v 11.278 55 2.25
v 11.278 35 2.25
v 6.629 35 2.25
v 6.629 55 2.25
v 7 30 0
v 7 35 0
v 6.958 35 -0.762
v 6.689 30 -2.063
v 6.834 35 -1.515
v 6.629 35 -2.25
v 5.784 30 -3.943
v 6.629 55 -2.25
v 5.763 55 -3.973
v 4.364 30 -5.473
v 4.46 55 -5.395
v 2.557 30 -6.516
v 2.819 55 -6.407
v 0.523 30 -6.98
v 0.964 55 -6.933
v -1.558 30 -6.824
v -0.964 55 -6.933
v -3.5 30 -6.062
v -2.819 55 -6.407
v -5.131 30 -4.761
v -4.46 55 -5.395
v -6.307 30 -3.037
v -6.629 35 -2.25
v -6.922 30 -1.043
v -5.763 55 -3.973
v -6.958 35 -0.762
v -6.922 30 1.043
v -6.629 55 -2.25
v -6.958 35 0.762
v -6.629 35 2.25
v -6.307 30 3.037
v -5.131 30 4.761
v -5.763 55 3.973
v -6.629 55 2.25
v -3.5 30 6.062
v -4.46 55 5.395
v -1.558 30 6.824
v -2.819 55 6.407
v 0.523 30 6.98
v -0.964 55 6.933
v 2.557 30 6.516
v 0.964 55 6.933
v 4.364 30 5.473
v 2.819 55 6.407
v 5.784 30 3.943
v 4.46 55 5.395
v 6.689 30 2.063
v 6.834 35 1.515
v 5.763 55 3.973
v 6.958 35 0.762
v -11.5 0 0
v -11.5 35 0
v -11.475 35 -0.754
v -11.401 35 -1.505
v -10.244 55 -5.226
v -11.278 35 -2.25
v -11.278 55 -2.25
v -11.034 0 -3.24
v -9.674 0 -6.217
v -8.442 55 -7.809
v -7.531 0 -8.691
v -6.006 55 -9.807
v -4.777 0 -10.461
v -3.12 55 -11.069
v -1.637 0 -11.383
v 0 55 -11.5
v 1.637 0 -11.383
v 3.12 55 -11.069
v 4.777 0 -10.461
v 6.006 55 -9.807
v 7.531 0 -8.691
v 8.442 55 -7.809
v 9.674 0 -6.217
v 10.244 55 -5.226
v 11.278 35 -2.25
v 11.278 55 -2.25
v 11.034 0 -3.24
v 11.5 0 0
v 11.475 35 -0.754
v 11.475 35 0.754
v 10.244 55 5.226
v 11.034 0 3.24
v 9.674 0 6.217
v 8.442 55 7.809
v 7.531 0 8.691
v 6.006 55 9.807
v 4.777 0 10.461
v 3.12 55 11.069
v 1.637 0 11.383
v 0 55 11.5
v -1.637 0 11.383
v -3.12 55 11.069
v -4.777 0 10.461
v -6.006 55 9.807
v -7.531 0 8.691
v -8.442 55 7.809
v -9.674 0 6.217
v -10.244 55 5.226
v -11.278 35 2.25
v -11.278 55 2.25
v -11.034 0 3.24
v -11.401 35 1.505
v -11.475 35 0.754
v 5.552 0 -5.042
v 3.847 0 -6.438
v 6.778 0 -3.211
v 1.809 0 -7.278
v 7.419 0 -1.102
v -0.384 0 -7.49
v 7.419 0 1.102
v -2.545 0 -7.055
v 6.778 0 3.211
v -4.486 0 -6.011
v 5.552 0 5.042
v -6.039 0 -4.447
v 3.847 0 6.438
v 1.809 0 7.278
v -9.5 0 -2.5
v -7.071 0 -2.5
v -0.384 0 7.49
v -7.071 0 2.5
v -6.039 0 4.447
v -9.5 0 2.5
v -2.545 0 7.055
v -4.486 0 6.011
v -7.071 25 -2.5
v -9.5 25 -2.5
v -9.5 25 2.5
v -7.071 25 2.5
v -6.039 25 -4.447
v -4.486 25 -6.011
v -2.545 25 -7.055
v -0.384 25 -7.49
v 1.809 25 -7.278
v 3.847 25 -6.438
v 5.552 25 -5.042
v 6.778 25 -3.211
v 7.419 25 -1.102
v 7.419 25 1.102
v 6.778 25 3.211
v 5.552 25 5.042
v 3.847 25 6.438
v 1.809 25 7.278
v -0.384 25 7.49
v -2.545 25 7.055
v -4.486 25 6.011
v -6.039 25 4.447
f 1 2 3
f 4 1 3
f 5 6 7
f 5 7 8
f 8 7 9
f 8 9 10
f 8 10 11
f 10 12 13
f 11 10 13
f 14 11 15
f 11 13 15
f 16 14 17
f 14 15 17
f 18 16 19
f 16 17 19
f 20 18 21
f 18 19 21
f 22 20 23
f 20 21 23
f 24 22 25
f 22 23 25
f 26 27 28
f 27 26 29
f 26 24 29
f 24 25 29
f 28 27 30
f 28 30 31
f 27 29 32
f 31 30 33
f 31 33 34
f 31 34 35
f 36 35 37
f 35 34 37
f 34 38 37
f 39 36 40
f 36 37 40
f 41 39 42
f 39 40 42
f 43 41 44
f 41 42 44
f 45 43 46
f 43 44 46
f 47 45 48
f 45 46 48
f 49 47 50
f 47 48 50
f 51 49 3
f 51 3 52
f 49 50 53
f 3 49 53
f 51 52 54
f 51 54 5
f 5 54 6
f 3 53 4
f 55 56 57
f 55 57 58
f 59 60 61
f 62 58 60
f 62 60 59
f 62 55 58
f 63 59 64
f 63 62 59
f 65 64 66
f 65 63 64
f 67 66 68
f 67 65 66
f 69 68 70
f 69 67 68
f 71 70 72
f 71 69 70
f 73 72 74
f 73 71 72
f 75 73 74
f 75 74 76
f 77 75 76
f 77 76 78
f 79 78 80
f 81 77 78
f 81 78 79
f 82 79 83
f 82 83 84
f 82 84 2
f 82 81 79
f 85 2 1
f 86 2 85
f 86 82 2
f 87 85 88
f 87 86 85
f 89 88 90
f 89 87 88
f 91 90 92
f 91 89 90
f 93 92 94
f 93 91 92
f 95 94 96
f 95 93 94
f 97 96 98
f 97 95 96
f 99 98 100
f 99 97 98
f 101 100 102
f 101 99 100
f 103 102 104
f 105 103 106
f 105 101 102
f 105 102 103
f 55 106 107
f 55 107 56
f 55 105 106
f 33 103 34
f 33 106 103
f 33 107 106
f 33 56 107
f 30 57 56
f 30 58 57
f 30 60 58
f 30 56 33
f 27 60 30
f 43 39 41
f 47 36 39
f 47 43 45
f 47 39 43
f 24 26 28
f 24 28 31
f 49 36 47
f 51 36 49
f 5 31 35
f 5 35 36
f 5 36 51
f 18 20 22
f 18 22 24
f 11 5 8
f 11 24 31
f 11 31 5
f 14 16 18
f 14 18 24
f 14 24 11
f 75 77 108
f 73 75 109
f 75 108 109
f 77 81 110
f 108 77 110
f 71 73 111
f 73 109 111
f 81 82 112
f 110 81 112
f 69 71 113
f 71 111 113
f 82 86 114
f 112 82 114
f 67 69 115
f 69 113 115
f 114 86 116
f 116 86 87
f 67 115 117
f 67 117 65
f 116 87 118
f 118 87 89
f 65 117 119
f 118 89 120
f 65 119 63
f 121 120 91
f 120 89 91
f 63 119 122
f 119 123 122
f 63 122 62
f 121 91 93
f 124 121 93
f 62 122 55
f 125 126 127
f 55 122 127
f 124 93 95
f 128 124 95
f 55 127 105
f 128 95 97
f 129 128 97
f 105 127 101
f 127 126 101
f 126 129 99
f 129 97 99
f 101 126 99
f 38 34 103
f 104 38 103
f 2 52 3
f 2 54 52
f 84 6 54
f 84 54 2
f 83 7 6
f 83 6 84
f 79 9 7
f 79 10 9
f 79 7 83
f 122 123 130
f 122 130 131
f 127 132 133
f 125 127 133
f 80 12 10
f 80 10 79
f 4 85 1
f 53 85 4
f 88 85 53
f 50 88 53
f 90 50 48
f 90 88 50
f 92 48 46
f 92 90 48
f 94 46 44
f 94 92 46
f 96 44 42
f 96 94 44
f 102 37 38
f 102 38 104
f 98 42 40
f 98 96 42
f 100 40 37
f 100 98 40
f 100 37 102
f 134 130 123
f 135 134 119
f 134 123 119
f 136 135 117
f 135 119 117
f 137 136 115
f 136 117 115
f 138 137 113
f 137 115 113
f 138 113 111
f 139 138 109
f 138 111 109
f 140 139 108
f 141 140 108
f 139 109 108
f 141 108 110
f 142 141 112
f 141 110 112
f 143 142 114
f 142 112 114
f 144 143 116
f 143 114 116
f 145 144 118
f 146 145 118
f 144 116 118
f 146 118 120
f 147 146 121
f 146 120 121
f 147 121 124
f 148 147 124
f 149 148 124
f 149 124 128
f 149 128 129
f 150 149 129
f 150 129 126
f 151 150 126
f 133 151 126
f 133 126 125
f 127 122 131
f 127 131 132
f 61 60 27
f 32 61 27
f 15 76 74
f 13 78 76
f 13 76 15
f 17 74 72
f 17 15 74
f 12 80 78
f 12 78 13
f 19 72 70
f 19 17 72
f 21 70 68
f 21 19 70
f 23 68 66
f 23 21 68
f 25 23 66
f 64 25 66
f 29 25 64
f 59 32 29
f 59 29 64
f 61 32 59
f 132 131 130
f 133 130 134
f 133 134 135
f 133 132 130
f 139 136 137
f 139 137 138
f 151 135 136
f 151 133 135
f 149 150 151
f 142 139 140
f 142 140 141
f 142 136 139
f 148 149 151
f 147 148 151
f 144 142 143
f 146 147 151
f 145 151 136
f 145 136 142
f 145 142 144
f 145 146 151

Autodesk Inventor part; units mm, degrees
ref_plane "YZ Plane" through (0, 0, 0) normal (1, 0, 0) x (0, 1, 0)
ref_plane "XZ Plane" through (0, 0, 0) normal (0, 1, 0) x (-1, 0, 0)
ref_plane "XY Plane" through (0, 0, 0) normal (0, 0, 1) x (1, 0, 0)
sketch "Skizze1" plane through (0, 0, 0) normal (0, 1, 0) x (-1, 0, 0)
  circle A0 centre (0, 0) radius 11.5
  dimension "d0" = 23
extrude "Extrusion1" add sketch "Skizze1" along normal blind 55
sketch "Skizze2" plane through (0, 55, 0) normal (0, 1, 0) x (1, 0, 0)
  circle A0 centre (0, 0) radius 7
  dimension "d3" = 14
extrude "Extrusion2" cut sketch "Skizze2" against normal blind 25
sketch "Skizze3" plane through (0, 55, 0) normal (0, 1, 0) x (1, 0, 0)
  line L0 (12.5, -2.25) -> (-12.5, -2.25)
  line L1 (-12.5, -2.25) -> (-12.5, 2.25)
  line L2 (-12.5, 2.25) -> (12.5, 2.25)
  line L3 (12.5, 2.25) -> (12.5, -2.25)
  line L4 (-17.5, 0) -> (17.5, 0) projected
  line L5 (0, 16.1) -> (0, -16.1) projected
  point P0 (0, 0)
  dimension "d6" = 4.5
  dimension "d7" = 25
extrude "Extrusion3" cut sketch "Skizze3" against normal blind 20
sketch "Skizze4" plane through (0, 0, 0) normal (0, -1, 0) x (1, 0, 0)
  circle A0 centre (0, 0) radius 7.5
  line L0 (-7.0711, -2.5) -> (-9.5, -2.5)
  line L1 (-9.5, -2.5) -> (-9.5, 2.5)
  line L2 (-9.5, 2.5) -> (-7.0711, 2.5)
  line L3 (-7.0711, 2.5) -> (-7.0711, -2.5)
  line L4 (-16.1, 0) -> (16.1, 0) projected
  point P0 (7.5, 0)
  point P1 (-7.0711, 2.5)
  dimension "d10" = 15
  dimension "d12" = 17
  dimension "d13" = 5
extrude "Extrusion4" cut sketch "Skizze4" against normal blind 25
properties part number "Honigfschleuder Motorkupplung"
